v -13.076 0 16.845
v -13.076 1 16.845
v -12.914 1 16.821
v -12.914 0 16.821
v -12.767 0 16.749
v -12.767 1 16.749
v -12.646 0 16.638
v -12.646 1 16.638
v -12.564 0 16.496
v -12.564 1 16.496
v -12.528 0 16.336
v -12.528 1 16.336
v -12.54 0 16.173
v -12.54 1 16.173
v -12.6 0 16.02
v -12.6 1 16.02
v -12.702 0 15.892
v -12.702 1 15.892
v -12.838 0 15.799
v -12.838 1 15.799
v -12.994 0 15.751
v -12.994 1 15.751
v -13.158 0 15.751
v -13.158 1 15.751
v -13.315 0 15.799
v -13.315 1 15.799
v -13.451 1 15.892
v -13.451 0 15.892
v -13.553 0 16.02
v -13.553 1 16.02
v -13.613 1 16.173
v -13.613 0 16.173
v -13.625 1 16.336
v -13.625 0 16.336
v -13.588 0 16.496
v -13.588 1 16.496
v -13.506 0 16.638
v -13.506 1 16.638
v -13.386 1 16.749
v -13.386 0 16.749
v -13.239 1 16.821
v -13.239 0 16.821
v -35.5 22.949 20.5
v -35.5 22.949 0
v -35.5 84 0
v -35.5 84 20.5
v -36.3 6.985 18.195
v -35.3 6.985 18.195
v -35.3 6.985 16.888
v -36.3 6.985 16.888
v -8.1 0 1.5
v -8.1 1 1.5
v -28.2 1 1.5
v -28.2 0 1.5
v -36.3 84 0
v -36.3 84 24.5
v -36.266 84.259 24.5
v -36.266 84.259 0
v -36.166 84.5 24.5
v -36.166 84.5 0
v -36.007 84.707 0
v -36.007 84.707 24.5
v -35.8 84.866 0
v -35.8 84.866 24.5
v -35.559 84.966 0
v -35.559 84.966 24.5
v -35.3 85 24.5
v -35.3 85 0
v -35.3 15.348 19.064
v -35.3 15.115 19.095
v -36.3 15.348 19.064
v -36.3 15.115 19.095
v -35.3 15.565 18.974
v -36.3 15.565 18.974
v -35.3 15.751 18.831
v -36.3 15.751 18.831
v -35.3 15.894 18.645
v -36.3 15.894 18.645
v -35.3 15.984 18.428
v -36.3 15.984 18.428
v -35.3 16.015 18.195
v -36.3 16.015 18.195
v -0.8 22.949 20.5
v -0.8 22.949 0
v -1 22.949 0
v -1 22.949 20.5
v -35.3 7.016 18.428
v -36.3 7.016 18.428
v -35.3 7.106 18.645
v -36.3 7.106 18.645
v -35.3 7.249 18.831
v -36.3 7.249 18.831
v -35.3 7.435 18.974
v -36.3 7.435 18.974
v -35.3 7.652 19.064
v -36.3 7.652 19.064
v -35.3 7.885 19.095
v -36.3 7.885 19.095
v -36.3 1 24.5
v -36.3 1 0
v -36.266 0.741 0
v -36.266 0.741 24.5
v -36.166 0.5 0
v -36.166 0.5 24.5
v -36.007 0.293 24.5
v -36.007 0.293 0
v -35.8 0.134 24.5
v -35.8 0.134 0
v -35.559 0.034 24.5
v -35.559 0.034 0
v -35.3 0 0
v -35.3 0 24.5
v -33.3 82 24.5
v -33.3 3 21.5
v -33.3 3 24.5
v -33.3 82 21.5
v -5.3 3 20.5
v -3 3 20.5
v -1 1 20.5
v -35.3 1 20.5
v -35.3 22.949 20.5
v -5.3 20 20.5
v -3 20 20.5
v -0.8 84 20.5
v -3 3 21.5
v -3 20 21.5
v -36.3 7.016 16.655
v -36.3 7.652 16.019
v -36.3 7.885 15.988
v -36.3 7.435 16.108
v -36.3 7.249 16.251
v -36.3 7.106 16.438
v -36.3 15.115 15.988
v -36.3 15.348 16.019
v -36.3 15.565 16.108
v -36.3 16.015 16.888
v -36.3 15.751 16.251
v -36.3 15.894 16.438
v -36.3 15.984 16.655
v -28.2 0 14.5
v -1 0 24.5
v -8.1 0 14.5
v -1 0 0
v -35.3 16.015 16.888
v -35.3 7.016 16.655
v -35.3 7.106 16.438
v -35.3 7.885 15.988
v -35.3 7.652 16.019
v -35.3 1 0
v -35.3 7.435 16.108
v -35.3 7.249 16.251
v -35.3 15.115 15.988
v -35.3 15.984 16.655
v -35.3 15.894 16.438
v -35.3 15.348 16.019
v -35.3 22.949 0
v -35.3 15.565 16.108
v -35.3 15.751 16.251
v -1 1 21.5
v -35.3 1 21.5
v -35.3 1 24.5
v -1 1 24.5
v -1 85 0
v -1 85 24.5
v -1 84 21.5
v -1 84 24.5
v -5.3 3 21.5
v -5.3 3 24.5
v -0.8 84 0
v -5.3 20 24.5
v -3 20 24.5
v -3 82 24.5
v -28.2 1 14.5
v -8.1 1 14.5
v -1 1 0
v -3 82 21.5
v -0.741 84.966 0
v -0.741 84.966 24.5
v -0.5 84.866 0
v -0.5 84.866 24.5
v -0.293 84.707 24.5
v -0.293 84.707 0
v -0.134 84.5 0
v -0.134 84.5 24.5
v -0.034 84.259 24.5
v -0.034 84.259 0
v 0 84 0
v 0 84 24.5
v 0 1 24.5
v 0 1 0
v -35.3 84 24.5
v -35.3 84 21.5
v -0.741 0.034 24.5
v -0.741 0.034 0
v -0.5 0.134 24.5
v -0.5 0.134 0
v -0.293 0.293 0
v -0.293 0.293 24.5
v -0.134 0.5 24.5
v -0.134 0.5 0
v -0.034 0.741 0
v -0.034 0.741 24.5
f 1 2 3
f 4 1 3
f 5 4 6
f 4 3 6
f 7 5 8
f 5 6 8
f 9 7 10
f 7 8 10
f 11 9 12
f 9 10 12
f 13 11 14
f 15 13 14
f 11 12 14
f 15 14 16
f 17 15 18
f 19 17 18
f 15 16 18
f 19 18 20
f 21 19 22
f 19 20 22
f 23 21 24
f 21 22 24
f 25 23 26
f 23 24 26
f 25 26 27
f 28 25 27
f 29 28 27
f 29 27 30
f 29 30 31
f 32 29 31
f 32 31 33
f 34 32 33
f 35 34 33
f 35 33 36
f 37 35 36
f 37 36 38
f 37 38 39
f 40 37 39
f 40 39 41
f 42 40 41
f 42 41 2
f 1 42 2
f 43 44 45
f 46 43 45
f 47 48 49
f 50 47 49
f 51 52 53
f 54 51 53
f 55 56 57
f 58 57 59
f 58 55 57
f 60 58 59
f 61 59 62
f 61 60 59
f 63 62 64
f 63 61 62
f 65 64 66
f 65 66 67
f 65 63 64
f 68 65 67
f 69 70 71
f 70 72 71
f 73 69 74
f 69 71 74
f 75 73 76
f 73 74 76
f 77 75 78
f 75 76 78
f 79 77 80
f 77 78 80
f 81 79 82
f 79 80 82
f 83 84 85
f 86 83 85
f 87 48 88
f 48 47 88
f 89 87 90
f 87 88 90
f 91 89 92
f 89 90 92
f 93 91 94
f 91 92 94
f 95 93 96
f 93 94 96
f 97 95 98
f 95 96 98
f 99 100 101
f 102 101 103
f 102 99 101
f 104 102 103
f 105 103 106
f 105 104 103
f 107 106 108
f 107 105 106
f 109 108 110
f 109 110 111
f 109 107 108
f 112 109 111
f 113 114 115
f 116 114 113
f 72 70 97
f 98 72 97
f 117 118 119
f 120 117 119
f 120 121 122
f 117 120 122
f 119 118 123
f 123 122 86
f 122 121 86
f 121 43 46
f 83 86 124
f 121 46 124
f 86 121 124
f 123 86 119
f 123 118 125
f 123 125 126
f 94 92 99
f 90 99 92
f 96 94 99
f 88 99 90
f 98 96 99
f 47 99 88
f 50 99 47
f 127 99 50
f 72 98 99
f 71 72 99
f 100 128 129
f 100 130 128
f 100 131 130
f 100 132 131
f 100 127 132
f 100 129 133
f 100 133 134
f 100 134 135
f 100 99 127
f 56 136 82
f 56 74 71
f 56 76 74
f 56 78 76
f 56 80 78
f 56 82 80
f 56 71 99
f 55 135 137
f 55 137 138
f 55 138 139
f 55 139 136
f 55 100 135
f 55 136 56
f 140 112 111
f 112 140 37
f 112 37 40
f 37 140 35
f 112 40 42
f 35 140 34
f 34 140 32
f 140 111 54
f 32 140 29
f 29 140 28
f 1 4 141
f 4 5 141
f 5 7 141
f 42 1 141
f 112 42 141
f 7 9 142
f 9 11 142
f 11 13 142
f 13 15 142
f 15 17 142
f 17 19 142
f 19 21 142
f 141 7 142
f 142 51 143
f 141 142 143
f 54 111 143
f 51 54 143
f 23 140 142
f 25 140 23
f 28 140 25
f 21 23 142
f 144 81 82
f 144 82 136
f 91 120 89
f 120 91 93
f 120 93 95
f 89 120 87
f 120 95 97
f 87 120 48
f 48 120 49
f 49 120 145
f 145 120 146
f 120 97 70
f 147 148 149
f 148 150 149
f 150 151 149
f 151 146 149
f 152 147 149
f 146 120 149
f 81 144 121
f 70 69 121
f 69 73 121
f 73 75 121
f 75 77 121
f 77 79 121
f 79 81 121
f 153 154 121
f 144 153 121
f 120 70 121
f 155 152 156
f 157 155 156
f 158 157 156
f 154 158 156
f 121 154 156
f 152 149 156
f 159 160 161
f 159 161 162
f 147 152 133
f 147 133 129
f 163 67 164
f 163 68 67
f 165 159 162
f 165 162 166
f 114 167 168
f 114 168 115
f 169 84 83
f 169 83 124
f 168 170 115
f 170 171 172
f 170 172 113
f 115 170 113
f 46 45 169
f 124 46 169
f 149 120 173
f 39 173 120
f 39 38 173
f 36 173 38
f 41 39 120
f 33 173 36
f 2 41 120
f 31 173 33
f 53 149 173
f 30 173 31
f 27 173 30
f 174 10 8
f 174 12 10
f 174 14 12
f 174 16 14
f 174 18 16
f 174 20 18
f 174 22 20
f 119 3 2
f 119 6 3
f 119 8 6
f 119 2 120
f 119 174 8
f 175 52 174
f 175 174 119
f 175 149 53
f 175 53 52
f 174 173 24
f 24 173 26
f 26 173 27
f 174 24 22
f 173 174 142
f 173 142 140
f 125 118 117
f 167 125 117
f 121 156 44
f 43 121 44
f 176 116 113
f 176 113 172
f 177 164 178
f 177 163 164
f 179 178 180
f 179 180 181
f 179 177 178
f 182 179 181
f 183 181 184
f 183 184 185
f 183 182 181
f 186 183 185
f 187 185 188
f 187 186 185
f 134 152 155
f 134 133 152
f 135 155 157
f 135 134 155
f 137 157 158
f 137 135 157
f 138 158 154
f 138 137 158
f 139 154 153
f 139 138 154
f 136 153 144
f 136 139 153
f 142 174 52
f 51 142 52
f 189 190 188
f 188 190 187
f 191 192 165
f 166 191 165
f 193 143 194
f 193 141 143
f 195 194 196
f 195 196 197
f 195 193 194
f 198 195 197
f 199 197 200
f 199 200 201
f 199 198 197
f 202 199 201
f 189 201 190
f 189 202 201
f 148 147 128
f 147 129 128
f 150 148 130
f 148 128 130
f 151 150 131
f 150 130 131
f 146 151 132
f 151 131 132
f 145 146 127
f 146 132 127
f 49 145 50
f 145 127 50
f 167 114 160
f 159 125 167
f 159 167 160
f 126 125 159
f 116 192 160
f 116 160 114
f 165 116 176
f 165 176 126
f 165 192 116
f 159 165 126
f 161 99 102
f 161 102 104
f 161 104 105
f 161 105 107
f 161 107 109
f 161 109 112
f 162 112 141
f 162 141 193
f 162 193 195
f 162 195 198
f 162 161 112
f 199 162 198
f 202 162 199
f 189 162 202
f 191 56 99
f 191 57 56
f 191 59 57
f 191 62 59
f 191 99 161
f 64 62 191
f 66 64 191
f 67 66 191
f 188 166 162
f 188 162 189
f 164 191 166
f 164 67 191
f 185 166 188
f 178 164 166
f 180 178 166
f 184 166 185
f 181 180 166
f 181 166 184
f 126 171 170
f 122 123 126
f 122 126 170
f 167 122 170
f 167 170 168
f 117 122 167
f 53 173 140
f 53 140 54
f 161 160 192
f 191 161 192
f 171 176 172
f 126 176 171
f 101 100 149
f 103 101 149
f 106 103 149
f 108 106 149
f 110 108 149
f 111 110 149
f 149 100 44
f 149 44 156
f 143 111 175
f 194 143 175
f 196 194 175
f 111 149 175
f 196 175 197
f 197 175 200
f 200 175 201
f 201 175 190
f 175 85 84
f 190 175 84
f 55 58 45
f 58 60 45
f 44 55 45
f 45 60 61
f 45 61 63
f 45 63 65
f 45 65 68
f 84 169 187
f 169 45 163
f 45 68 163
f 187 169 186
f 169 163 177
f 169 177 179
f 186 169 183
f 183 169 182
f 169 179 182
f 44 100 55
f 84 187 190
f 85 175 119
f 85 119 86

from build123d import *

# Parameters (mm, degrees)
SKIZZE1_W                       = 36.3
SKIZZE1_H                       = 85
AUFSATZ_LINEAR_AUSTRAGEN1_DEPTH = 21.5
WANDUNG1_T                      = -1
SKIZZE4_W                       = 9.03
SKIZZE4_H                       = 3.107106781
SCHNITT_LINEAR_AUSTRAGEN1_DEPTH = 10
SKIZZE8_W                       = 36.3
SKIZZE8_H                       = 85
SKIZZE8_W_2                     = 34.3
SKIZZE8_H_2                     = 83
AUFSATZ_LINEAR_AUSTRAGEN5_DEPTH = 3
VERRUNDUNG1_R                   = 0.9
VERRUNDUNG2_R                   = 1
SKIZZE11_W                      = 34.7
SKIZZE11_H                      = 61.050585676
SCHNITT_LINEAR_AUSTRAGEN5_DEPTH = 20.5
SKIZZE6_W                       = 2.3
SKIZZE6_H                       = 17
SCHNITT_LINEAR_AUSTRAGEN6_DEPTH = 1
AUFSATZ_LINEAR_AUSTRAGEN7_DEPTH = 3
SKIZZE13_R                      = 0.55
SCHNITT_LINEAR_AUSTRAGEN7_DEPTH = 2
SKIZZE14_W                      = 13
SKIZZE14_H                      = 20.1
SCHNITT_LINEAR_AUSTRAGEN8_DEPTH = 3


with BuildPart() as part:
    # Skizze1 → Aufsatz-Linear austragen1 (new body)
    with BuildSketch(Plane.XY):
        with Locations((-18.15, 42.5)):
            Rectangle(SKIZZE1_W, SKIZZE1_H)
    extrude(amount=AUFSATZ_LINEAR_AUSTRAGEN1_DEPTH)

    # Wandung1
    wandung1_openings = [part.faces().sort_by_distance(p)[0] for p in [
        (-18.15, 42.5, 0),
    ]]
    offset(amount=WANDUNG1_T, openings=wandung1_openings, kind=Kind.INTERSECTION)

    # Skizze4 → Schnitt-Linear austragen1 (cut)
    with BuildSketch(Plane(origin=(-35.3, 59.749407146, -1119.925163107), x_dir=(0, -1, 0), z_dir=(1, 0, 0))):
        with Locations((48.249407146, -1137.466609716)):
            Rectangle(SKIZZE4_W, SKIZZE4_H)
    extrude(amount=-SCHNITT_LINEAR_AUSTRAGEN1_DEPTH, mode=Mode.SUBTRACT)

    # Skizze8 → Aufsatz-Linear austragen5 (add)
    with BuildSketch(Plane.XY.offset(21.5)):
        with Locations((-18.15, 42.5)):
            Rectangle(SKIZZE8_W, SKIZZE8_H)
        with Locations((-18.15, 42.5)):
            Rectangle(SKIZZE8_W_2, SKIZZE8_H_2, mode=Mode.SUBTRACT)
    extrude(amount=AUFSATZ_LINEAR_AUSTRAGEN5_DEPTH)

    # Verrundung1
    verrundung1_edges = [part.edges().sort_by_distance(p)[0] for p in [
        (-35.8, 6.985, 15.987893219),
        (-35.8, 6.985, 19.095),
        (-35.8, 16.015, 19.095),
        (-35.8, 16.015, 15.987893219),
    ]]
    fillet(verrundung1_edges, radius=VERRUNDUNG1_R)

    # Verrundung2
    verrundung2_edges = [part.edges().sort_by_distance(p)[0] for p in [
        (-36.3, 85, 12.25),
        (-36.3, 0, 12.25),
        (0, 0, 12.25),
        (0, 85, 12.25),
    ]]
    fillet(verrundung2_edges, radius=VERRUNDUNG2_R)

    # Skizze11 → Schnitt-Linear austragen5 (cut)
    with BuildSketch(Plane(origin=(0, 0, 0), x_dir=(-1, 0, 0), z_dir=(0, 0, -1))):
        with Locations((18.15, 53.474707162)):
            Rectangle(SKIZZE11_W, SKIZZE11_H)
    extrude(amount=-SCHNITT_LINEAR_AUSTRAGEN5_DEPTH, mode=Mode.SUBTRACT)

    # Skizze6 → Schnitt-Linear austragen6 (cut)
    with BuildSketch(Plane(origin=(0, 0, 20.5), x_dir=(-1, 0, 0), z_dir=(0, 0, -1))):
        with Locations((4.15, 11.5)):
            Rectangle(SKIZZE6_W, SKIZZE6_H)
    extrude(amount=-SCHNITT_LINEAR_AUSTRAGEN6_DEPTH, mode=Mode.SUBTRACT)

    # Skizze12 → Aufsatz-Linear austragen7 (add)
    with BuildSketch(Plane.XY.offset(21.5)):
        Polygon((-3, 20), (-5.3, 20), (-5.3, 3), (-33.3, 3), (-33.3, 82), (-3, 82), align=None)
    extrude(amount=AUFSATZ_LINEAR_AUSTRAGEN7_DEPTH)

    # Skizze13 → Schnitt-Linear austragen7 (cut)
    with BuildSketch(Plane(origin=(-2.822587719, 1, -1119.925163107), x_dir=(0, 0, -1), z_dir=(0, 1, 0))):
        with Locations(Location((-1136.220163107, 10.253821552, 0), (0, 0, 180))):
            Circle(SKIZZE13_R)
    extrude(amount=-SCHNITT_LINEAR_AUSTRAGEN7_DEPTH, mode=Mode.SUBTRACT)

    # Skizze14 → Schnitt-Linear austragen8 (cut)
    with BuildSketch(Plane(origin=(-2.822587719, 1, -1119.925163107), x_dir=(0, 0, -1), z_dir=(0, 1, 0))):
        with Locations((-1127.925163107, 15.327412281)):
            Rectangle(SKIZZE14_W, SKIZZE14_H)
    extrude(amount=-SCHNITT_LINEAR_AUSTRAGEN8_DEPTH, mode=Mode.SUBTRACT)


solid = part.part
